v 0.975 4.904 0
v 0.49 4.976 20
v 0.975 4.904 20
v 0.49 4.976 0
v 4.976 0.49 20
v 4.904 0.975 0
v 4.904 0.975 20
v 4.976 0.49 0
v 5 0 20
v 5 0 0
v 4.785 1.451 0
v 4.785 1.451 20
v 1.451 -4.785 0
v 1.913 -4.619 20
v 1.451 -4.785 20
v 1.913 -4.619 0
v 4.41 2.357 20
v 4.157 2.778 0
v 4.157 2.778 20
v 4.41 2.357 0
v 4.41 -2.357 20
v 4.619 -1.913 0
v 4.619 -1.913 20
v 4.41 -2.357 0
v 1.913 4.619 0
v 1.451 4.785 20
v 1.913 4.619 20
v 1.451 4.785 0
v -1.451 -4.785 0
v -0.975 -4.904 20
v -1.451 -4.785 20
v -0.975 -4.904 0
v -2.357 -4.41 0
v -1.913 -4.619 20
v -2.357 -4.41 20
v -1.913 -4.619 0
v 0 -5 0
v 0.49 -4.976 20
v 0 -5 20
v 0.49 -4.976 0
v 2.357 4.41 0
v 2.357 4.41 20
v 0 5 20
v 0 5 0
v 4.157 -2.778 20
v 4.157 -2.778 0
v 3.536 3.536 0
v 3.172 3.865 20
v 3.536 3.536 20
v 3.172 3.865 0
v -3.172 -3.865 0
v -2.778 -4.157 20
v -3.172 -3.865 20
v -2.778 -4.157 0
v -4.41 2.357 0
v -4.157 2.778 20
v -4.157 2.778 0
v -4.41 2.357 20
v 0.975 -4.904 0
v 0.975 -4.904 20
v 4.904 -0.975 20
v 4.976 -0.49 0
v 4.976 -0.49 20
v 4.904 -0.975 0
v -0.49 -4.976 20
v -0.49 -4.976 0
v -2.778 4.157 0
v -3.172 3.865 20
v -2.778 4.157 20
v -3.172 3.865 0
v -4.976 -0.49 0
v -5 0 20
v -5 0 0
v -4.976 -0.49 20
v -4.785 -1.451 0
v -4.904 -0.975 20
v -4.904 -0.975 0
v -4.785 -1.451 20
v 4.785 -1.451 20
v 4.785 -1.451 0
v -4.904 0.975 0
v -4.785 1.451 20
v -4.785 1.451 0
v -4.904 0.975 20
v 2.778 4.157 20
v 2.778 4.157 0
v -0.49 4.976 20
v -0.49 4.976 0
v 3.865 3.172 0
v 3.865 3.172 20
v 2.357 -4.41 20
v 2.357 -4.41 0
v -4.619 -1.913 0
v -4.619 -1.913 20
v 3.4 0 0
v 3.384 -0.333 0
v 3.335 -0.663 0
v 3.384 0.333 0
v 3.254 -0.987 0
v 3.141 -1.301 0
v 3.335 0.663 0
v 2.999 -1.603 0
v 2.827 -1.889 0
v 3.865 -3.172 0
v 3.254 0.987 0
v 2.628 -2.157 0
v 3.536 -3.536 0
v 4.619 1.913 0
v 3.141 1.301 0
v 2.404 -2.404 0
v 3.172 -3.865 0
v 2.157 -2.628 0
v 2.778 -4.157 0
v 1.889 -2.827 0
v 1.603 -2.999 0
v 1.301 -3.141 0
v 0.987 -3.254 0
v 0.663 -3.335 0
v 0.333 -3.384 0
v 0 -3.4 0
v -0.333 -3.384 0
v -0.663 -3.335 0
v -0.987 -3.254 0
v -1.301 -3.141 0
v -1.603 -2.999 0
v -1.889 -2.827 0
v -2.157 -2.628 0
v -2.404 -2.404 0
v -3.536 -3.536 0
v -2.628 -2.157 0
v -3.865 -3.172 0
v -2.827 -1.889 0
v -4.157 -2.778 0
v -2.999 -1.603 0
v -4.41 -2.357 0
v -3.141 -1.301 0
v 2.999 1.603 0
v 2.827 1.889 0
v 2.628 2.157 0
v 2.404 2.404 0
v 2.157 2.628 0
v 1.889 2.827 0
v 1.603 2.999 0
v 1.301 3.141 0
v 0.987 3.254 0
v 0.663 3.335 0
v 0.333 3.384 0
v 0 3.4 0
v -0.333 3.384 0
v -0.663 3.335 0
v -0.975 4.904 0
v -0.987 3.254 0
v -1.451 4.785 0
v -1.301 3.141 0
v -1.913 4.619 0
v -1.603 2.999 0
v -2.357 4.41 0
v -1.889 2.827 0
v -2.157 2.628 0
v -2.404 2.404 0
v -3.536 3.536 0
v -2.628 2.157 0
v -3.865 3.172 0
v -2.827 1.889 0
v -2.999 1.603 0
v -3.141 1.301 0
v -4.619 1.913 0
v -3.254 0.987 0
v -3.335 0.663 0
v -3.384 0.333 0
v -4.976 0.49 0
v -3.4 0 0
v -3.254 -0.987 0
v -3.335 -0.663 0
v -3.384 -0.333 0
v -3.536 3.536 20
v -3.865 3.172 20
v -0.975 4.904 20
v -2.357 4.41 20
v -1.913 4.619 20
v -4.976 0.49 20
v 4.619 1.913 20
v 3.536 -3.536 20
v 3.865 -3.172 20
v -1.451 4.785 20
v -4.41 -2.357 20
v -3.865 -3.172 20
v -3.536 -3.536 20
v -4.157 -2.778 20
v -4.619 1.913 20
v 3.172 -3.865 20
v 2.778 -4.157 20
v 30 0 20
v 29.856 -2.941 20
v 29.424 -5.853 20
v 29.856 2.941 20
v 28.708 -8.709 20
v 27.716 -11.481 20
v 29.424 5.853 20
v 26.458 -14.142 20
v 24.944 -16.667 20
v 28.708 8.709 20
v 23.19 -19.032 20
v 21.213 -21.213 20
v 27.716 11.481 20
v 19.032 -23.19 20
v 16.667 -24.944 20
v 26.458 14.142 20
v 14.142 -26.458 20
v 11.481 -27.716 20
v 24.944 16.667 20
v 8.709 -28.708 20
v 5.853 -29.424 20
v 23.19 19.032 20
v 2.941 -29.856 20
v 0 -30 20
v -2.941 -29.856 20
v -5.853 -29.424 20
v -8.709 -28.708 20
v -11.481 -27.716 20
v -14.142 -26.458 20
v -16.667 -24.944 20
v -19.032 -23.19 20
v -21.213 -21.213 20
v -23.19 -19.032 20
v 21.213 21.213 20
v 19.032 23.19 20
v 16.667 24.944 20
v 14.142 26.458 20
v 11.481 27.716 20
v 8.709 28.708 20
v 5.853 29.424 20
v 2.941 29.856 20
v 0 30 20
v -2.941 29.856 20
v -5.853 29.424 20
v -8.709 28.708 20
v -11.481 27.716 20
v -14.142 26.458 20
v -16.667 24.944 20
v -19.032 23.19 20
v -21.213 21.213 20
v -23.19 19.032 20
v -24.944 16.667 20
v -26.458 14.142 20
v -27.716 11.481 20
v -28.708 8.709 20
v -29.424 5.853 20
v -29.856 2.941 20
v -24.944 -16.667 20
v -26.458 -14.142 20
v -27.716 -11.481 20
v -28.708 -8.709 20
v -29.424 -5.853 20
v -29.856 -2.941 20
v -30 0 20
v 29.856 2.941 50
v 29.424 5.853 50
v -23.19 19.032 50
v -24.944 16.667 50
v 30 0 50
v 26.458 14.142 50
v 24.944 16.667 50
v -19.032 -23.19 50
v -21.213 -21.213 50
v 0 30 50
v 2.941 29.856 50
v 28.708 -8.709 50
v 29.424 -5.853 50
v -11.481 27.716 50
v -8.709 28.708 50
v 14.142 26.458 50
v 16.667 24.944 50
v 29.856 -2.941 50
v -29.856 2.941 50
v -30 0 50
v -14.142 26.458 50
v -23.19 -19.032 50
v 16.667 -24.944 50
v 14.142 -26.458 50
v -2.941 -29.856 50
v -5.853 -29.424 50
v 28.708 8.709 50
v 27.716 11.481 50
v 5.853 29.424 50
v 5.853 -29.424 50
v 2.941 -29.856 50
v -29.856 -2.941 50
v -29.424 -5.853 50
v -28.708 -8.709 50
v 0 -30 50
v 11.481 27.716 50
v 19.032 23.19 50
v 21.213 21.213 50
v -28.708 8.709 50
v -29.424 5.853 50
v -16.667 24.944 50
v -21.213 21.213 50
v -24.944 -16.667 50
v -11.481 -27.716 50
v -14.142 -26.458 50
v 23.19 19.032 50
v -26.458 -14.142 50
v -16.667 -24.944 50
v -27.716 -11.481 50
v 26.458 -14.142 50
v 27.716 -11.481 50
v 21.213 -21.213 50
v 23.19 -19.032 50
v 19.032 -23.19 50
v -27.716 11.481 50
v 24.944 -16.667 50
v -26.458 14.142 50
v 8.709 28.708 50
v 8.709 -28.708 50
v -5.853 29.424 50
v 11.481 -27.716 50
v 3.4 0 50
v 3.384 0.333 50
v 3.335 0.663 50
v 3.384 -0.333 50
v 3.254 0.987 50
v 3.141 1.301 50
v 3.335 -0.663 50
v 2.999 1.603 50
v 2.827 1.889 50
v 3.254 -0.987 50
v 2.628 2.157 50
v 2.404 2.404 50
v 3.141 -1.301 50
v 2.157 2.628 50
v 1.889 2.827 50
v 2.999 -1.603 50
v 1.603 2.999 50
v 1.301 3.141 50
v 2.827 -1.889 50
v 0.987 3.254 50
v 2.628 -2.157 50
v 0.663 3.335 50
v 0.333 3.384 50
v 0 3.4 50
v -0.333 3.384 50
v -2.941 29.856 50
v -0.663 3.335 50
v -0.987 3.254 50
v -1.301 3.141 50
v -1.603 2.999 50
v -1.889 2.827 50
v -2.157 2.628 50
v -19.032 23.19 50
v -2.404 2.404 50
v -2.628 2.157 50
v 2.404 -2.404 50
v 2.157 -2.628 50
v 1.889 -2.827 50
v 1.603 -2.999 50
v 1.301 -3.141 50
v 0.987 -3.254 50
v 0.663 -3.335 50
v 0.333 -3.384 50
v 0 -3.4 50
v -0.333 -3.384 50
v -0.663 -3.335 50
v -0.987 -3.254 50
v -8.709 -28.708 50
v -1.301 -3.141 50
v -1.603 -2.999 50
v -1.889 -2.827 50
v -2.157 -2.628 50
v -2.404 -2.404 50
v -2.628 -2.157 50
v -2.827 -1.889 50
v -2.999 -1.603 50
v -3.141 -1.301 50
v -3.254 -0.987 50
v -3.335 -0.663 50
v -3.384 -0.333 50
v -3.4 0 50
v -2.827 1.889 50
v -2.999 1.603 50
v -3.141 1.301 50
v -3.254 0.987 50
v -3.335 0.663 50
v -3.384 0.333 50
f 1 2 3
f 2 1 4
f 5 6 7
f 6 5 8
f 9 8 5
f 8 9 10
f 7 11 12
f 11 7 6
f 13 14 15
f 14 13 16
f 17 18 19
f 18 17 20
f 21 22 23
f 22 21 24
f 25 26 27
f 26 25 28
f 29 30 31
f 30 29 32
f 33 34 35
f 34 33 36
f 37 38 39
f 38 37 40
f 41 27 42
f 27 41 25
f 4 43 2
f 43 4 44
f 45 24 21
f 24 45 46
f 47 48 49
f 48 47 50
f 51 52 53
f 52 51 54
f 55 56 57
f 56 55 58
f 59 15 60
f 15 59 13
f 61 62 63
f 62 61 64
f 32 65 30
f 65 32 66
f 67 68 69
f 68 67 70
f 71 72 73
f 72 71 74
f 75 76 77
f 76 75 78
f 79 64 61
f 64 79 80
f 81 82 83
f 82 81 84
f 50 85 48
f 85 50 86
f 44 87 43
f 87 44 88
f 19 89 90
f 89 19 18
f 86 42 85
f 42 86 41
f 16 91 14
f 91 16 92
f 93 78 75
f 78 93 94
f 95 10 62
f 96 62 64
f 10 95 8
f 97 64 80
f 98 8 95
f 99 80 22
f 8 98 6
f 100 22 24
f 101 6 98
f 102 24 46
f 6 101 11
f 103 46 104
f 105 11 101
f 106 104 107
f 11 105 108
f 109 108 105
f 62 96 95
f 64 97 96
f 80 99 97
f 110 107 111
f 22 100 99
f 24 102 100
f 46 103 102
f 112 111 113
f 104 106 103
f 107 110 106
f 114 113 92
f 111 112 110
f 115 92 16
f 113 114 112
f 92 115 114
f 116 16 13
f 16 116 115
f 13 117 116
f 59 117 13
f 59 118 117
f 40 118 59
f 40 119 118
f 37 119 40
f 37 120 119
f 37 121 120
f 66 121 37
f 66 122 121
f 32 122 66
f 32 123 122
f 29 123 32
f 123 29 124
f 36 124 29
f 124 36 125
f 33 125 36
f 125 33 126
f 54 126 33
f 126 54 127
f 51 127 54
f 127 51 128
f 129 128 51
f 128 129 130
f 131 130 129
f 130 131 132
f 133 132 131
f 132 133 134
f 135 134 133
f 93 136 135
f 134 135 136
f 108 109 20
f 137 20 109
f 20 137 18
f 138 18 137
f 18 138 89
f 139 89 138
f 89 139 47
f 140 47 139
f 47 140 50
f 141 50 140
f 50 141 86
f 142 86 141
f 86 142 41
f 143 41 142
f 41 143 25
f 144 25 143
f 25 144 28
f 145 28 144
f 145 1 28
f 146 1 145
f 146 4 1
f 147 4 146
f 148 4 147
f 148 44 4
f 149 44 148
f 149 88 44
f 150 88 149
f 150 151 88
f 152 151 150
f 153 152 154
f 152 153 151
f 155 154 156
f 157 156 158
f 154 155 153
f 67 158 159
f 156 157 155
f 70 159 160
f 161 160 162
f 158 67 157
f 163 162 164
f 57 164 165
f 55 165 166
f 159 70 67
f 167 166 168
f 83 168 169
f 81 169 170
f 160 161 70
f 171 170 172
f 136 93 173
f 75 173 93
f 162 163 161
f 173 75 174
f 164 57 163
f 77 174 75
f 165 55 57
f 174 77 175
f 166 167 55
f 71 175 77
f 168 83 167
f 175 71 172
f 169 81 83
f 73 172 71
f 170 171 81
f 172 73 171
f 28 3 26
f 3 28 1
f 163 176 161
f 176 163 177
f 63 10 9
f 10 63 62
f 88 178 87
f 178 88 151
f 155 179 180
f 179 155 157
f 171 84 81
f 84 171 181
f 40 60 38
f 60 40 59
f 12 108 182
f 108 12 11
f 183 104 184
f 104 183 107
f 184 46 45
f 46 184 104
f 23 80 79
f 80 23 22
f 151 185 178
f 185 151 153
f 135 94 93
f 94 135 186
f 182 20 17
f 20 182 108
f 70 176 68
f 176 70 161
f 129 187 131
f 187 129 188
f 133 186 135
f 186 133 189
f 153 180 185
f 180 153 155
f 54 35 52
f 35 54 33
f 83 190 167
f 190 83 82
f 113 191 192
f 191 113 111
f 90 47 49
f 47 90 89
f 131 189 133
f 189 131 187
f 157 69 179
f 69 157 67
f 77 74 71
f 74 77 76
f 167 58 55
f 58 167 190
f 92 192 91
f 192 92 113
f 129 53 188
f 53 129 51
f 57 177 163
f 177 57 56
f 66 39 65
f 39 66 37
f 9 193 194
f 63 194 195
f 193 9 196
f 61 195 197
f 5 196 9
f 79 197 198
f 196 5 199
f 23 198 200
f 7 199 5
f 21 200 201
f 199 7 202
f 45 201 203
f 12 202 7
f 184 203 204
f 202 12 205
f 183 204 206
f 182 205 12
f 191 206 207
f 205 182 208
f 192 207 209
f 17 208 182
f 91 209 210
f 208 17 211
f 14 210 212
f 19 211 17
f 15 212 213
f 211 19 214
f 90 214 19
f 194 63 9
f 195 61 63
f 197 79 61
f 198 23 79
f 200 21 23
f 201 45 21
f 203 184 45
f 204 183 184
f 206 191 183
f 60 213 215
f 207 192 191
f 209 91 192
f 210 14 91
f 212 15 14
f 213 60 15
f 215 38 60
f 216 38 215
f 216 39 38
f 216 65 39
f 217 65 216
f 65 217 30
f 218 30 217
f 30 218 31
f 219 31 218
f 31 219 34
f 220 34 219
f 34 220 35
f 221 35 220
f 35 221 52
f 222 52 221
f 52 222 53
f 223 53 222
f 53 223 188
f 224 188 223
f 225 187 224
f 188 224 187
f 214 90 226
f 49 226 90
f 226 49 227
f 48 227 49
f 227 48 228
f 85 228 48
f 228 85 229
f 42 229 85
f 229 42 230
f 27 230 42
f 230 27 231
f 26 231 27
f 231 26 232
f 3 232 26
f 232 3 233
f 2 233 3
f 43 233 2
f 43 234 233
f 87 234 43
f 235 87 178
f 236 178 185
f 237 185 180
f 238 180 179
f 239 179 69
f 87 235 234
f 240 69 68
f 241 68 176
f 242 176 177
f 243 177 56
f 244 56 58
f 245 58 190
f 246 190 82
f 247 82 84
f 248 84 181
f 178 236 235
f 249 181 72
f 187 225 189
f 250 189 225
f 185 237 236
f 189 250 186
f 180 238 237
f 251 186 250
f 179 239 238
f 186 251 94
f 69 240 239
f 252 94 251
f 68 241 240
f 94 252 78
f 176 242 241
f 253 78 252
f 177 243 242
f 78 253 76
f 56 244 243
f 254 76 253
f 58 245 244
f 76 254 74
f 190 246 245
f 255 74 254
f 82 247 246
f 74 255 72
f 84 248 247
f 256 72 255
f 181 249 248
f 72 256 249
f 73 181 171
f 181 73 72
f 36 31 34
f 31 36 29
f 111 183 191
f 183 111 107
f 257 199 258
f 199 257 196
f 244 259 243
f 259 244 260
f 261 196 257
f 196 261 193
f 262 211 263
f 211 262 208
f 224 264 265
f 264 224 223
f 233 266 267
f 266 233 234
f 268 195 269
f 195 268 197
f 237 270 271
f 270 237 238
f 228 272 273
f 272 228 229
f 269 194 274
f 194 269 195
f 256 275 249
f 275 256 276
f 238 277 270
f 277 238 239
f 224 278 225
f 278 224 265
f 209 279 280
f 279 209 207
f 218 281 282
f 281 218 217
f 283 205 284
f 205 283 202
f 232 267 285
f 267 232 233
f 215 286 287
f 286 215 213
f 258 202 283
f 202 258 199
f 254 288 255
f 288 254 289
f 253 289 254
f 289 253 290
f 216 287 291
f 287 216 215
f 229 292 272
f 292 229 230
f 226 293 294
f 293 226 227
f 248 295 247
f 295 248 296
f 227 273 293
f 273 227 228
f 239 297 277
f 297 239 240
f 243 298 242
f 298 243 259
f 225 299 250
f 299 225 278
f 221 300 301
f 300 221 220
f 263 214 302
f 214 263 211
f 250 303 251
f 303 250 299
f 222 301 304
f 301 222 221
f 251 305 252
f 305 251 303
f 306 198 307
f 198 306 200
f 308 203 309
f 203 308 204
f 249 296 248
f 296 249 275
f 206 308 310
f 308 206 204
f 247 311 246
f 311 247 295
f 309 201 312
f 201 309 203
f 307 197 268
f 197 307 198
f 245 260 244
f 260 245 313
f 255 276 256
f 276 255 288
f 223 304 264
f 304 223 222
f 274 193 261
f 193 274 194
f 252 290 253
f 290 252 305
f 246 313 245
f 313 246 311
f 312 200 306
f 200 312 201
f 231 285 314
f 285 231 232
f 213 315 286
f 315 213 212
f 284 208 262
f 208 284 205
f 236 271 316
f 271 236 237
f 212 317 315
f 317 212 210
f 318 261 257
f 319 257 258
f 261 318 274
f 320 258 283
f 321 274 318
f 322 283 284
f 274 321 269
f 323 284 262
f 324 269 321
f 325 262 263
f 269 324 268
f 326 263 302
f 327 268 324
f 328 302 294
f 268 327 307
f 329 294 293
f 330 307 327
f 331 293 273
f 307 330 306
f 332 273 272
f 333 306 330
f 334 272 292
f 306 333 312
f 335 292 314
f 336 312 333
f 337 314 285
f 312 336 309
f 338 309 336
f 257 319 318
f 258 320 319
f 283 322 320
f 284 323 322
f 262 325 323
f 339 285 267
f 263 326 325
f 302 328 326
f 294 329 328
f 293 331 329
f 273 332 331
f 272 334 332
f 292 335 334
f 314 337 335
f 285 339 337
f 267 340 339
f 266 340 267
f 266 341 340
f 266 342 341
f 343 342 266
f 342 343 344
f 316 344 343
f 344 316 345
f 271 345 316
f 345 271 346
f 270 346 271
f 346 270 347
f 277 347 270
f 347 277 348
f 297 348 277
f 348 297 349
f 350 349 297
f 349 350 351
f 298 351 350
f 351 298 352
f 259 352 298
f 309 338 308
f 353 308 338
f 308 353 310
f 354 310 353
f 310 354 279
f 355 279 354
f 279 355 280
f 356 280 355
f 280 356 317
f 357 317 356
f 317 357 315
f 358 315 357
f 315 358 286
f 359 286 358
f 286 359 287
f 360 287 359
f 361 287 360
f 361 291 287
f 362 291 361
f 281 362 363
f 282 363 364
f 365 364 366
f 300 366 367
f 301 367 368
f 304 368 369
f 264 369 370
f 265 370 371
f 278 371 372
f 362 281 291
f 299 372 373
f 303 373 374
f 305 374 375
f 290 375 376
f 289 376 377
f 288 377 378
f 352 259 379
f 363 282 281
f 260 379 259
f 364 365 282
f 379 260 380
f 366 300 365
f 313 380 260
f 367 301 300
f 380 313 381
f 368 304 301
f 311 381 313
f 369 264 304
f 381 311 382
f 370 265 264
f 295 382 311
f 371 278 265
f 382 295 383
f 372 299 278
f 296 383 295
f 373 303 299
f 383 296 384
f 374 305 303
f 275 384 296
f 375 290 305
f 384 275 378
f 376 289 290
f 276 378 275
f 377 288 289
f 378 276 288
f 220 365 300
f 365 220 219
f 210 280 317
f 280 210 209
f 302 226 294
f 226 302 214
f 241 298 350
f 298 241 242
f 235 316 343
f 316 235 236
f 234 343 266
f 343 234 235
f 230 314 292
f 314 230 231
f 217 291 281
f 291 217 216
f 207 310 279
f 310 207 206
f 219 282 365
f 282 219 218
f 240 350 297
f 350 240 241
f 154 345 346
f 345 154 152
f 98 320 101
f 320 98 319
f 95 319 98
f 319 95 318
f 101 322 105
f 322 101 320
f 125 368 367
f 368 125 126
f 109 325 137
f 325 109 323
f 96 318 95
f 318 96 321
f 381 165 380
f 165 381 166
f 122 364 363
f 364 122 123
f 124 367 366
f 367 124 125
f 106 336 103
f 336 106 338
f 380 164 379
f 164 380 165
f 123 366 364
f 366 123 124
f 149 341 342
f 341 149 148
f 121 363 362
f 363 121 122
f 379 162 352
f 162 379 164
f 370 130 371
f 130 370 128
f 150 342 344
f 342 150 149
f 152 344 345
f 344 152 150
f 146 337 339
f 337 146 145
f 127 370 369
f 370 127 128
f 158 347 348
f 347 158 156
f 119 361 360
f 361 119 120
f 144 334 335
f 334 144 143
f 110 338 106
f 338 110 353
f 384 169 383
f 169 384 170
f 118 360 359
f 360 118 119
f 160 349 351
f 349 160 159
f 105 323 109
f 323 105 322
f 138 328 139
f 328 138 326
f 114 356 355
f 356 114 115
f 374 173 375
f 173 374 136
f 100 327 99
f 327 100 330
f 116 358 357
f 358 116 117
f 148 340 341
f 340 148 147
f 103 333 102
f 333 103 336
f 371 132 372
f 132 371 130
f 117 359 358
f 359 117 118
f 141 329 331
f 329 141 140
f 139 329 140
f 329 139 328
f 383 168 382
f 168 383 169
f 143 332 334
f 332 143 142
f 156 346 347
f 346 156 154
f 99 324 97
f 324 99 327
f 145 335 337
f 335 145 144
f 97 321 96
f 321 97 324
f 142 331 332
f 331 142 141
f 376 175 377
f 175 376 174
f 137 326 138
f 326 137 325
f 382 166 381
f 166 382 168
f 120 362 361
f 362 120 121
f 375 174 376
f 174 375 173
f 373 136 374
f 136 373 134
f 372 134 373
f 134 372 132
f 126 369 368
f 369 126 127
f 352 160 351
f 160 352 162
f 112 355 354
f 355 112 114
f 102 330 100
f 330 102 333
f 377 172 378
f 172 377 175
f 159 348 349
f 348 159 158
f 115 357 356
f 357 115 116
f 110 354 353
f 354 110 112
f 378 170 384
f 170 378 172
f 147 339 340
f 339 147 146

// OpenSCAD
// Lab funnel - printed upright, wide opening at the top
// Units: mm

// ---- Dimensions ----
spout_od      = 10;    // spout outer diameter (z = 0 to 20)
spout_len     = 20;    // spout length
cone_top_od   = 10;    // cone outer diameter at z = 20
cone_rim_od   = 60;    // cone rim outer diameter at z = 50
cone_h        = 30;    // cone height (z = 20 to 50)
wall          = 1.6;   // wall thickness everywhere

// ---- Derived ----
bore          = spout_od - 2 * wall;   // spout bore diameter
cut_extra     = 0.5;   // overshoot for clean boolean cuts

$fn = 64;

difference() {
    union() {
        // Spout: z = 0 .. 20
        cylinder(d = spout_od, h = spout_len);
        // Cone: z = 20 .. 50 (overlaps spout at the seam, fused)
        translate([0, 0, spout_len])
            linear_extrude(height = cone_h)
                circle(d = cone_rim_od, $fn = 64);
    }
    // Through-bore: same bore diameter up through the rim
    translate([0, 0, -cut_extra])
        cylinder(d = bore, h = spout_len + cone_h + 2 * cut_extra);
}
